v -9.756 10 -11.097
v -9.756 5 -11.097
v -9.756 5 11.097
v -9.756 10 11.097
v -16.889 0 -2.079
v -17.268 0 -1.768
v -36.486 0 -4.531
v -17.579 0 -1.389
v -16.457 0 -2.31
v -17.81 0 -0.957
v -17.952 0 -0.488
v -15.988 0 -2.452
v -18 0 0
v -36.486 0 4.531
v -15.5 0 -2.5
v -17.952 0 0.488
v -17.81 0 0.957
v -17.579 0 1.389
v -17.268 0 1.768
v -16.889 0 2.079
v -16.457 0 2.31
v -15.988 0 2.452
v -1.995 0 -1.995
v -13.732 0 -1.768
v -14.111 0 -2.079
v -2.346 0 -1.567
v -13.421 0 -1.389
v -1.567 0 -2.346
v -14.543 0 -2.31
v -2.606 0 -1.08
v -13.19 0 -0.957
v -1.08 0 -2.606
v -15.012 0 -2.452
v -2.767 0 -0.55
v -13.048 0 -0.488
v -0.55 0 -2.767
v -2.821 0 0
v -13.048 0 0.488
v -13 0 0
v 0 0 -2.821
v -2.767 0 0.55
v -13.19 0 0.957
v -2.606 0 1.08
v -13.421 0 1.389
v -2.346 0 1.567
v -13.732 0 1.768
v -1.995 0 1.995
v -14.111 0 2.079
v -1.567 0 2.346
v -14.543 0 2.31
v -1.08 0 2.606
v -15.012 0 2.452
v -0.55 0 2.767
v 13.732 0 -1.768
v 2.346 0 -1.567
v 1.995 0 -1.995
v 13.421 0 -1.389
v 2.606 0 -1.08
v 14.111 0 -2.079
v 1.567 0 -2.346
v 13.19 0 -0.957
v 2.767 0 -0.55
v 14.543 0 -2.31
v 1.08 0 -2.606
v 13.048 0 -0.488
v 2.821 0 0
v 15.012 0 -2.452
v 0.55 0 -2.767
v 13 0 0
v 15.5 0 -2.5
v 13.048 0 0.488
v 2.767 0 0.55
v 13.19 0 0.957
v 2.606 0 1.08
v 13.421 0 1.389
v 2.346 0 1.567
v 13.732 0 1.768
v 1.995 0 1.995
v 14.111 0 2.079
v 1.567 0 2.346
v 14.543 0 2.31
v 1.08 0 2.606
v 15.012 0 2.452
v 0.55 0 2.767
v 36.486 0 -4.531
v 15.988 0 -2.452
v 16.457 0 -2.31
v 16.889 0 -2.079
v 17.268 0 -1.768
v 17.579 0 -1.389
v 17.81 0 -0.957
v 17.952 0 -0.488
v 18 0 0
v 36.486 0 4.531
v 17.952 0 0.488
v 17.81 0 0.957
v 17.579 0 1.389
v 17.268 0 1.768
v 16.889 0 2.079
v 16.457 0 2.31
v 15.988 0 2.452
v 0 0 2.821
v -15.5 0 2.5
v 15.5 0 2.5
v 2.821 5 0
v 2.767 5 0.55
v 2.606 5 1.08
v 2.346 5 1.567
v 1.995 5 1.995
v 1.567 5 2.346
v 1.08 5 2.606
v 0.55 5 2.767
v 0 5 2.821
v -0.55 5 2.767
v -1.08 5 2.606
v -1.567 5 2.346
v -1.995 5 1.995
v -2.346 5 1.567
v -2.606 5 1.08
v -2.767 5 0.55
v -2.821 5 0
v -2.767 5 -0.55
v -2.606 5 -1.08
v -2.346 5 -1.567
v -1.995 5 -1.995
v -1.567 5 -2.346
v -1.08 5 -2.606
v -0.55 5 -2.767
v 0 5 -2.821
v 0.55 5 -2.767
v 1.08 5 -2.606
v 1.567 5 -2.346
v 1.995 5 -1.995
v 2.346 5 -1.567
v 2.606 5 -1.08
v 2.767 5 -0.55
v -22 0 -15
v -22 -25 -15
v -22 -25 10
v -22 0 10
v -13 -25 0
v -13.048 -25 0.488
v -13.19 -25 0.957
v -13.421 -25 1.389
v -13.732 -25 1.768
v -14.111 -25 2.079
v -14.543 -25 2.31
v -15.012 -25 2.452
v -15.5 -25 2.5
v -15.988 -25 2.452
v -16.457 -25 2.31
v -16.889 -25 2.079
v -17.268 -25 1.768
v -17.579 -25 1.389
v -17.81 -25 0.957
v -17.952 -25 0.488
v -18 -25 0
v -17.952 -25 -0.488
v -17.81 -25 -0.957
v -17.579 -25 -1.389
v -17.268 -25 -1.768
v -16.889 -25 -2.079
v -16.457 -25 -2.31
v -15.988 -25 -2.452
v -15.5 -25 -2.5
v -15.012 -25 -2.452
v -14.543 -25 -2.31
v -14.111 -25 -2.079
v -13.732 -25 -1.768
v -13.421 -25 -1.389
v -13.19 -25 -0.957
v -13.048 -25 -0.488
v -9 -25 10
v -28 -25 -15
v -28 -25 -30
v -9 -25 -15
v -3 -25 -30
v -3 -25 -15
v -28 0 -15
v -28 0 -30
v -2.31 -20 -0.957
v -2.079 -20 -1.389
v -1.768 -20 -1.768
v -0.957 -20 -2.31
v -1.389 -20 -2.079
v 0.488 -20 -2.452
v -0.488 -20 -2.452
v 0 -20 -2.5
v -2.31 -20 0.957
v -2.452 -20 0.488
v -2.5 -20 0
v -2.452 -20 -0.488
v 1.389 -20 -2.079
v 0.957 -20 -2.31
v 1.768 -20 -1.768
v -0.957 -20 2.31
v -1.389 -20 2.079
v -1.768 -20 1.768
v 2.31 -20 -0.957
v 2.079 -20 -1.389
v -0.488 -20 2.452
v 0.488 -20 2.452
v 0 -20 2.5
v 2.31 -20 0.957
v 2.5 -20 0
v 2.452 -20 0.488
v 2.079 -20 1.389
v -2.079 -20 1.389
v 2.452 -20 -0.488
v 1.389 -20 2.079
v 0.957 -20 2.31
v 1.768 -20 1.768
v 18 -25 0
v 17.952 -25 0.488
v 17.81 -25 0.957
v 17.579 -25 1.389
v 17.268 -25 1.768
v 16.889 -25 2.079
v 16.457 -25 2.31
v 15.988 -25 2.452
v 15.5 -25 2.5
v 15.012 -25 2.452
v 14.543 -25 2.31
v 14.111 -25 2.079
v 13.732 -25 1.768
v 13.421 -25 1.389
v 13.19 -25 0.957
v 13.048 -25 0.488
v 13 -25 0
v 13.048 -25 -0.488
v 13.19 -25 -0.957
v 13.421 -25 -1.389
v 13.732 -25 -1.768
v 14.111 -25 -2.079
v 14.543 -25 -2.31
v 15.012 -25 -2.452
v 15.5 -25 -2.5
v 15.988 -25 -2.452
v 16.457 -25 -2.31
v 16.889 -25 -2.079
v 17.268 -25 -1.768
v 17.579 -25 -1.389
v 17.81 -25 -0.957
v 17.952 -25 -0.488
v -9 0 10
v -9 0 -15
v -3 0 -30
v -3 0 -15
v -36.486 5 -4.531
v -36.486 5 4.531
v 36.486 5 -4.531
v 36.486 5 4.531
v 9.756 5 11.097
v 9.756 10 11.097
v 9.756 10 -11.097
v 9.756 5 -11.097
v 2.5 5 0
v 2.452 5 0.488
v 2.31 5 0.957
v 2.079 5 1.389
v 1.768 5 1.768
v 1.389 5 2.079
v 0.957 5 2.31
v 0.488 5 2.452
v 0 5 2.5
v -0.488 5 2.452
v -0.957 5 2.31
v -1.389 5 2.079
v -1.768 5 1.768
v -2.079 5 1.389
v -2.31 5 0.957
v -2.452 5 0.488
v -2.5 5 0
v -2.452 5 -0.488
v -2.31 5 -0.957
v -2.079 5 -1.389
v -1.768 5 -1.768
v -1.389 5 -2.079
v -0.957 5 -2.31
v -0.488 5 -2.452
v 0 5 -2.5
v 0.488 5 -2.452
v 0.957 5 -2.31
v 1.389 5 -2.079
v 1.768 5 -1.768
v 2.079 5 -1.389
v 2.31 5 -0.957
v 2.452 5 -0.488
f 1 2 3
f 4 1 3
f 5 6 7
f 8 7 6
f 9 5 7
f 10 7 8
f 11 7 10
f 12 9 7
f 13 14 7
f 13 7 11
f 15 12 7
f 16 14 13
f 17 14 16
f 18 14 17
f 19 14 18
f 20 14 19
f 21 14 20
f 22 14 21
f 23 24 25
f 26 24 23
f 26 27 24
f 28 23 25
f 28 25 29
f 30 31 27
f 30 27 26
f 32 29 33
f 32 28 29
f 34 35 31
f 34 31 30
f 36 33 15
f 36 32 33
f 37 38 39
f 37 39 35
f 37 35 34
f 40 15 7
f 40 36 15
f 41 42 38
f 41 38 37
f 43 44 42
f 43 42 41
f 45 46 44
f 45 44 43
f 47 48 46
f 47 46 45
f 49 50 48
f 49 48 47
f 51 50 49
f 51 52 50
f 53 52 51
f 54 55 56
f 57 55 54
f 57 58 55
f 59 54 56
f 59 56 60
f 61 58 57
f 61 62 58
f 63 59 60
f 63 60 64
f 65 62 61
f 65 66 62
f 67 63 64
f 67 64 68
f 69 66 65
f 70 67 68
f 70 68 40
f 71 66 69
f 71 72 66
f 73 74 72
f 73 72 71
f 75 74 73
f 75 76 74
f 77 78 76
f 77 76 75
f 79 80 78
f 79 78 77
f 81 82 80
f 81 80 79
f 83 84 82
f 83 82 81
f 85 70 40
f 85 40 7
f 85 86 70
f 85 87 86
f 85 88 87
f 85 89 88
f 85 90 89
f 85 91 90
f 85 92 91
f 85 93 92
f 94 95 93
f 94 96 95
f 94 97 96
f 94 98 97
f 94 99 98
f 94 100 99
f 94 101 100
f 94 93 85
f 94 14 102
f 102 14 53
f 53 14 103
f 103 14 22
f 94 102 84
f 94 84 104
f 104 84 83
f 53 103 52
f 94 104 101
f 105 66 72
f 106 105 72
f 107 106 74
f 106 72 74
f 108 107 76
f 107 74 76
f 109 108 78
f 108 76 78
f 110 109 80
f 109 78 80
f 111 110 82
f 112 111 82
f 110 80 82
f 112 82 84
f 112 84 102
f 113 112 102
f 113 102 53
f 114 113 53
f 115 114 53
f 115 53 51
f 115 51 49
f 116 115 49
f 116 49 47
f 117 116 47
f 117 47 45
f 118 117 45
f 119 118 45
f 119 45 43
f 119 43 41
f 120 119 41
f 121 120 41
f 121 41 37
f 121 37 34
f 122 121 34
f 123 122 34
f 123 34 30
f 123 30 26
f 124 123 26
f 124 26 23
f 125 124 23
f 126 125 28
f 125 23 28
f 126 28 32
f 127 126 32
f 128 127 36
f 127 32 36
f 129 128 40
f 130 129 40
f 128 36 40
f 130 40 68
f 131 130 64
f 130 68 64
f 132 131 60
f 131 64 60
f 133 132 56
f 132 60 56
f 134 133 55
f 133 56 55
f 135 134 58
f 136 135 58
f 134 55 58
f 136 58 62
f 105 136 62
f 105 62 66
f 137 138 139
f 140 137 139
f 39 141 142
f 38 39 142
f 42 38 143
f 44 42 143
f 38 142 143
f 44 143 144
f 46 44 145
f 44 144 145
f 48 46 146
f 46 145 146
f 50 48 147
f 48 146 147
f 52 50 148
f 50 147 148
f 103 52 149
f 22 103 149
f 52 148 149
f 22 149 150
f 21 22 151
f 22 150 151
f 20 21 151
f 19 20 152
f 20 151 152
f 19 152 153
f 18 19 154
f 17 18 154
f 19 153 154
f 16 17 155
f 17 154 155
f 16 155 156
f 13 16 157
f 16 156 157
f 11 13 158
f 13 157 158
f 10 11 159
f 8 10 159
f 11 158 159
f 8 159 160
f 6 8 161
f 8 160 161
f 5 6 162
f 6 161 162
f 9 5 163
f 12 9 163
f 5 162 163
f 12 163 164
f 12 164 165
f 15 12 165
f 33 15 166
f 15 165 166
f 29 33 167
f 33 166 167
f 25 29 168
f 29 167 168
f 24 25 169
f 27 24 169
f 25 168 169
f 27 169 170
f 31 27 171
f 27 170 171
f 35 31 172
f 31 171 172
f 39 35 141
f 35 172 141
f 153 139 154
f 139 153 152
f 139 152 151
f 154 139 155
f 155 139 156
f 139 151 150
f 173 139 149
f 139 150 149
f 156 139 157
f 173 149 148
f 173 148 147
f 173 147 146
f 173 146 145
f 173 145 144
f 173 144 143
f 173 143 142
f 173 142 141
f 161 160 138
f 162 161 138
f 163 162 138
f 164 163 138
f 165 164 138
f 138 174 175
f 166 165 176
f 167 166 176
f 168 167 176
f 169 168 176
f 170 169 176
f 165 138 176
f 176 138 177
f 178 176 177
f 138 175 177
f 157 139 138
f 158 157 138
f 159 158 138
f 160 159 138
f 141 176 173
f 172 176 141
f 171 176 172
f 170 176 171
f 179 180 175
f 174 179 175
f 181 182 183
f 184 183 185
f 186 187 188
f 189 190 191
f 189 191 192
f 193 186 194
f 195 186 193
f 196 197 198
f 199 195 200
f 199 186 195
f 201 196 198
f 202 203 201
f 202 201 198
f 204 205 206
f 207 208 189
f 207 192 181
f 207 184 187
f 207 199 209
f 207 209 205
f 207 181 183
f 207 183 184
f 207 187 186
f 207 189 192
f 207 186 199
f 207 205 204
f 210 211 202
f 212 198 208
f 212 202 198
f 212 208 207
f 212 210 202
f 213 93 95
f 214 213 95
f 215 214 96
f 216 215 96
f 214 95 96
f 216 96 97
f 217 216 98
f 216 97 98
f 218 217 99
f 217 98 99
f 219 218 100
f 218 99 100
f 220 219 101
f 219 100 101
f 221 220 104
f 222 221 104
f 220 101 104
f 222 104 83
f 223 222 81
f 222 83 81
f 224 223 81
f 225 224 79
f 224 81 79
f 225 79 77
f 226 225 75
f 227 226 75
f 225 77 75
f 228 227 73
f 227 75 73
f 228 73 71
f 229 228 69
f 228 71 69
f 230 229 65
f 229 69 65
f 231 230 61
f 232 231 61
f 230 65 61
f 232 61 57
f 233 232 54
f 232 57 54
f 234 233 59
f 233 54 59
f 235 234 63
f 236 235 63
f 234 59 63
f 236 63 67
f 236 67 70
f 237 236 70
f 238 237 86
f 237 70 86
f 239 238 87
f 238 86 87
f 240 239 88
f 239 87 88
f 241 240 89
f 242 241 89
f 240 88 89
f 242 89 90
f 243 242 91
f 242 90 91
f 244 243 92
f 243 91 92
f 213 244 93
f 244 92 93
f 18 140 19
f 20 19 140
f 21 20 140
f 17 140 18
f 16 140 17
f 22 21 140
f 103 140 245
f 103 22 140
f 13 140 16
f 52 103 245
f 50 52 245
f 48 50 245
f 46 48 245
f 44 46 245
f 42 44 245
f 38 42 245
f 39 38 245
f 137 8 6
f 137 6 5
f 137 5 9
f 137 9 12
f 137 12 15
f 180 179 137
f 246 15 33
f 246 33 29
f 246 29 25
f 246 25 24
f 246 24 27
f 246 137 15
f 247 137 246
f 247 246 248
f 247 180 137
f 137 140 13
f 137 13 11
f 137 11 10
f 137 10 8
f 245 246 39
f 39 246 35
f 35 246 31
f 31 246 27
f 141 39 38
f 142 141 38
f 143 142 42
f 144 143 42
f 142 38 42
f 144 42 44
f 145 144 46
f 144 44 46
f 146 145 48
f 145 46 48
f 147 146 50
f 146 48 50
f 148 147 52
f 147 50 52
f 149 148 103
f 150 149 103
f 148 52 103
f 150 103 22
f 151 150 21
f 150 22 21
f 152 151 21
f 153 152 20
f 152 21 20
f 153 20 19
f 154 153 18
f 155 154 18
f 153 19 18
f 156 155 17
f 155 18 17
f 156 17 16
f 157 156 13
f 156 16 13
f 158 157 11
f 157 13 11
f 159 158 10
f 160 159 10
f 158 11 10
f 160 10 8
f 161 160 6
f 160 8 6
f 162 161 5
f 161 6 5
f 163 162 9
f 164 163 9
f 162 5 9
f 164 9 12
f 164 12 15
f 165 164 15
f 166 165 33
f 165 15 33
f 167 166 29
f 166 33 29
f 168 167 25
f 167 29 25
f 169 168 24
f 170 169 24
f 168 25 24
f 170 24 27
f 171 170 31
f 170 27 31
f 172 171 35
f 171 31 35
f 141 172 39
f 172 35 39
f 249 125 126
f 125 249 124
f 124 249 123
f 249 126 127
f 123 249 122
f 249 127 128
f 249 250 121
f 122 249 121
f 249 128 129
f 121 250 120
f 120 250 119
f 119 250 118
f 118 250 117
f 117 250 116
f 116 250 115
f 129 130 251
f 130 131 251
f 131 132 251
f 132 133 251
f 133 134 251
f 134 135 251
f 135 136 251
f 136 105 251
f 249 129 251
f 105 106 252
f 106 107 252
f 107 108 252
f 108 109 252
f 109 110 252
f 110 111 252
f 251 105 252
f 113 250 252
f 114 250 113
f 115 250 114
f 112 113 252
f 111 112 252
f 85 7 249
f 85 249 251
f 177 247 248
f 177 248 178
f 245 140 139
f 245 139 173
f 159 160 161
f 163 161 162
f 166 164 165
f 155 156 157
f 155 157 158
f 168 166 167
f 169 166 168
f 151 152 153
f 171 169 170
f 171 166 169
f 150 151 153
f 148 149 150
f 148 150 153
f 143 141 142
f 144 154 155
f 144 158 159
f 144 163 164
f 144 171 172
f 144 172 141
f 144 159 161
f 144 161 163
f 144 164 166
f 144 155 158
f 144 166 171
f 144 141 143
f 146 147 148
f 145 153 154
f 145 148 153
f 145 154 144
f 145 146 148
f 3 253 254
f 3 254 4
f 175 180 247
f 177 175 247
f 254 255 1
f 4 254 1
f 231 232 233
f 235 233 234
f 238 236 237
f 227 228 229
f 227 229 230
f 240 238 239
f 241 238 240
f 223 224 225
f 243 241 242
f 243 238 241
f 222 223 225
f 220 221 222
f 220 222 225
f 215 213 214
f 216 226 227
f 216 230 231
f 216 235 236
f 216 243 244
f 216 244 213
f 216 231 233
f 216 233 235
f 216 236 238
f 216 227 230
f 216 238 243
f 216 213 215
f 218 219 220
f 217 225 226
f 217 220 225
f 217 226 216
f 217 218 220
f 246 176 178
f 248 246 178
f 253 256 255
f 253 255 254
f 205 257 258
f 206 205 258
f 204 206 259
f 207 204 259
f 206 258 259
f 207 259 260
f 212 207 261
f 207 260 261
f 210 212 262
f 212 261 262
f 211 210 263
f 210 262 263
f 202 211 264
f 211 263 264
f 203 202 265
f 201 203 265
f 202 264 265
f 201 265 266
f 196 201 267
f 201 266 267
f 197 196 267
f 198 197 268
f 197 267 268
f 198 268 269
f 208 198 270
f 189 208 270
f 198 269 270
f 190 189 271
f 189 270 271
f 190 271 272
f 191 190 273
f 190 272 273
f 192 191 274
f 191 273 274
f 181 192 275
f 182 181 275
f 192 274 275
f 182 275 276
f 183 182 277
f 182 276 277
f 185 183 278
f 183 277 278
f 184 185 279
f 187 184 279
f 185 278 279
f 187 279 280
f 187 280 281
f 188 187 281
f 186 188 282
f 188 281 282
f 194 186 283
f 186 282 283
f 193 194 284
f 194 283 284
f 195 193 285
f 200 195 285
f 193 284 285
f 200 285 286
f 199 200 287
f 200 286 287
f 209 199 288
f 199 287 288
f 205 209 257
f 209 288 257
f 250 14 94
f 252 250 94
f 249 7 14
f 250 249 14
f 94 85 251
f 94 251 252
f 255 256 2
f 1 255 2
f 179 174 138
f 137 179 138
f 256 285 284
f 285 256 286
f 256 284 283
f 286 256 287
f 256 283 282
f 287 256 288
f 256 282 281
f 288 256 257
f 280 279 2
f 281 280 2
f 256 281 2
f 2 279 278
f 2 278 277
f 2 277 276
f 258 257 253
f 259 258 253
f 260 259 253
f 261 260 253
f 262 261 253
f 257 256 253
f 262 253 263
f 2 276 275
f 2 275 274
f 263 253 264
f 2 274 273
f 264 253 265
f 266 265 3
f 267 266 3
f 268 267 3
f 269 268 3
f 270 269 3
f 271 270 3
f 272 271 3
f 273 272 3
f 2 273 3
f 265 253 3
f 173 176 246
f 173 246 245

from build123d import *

# Parameters (mm, degrees)
F0_W      = 25
F0_H      = 30
F1_DEPTH  = 25
F2_DEPTH  = 10
F3_R      = 2.5
F4_DEPTH  = 25
F5_W      = 72.9725211859
F5_H      = 9.0611493215
F6_DEPTH  = 5
F7_R      = 2.5
F8_DEPTH  = 25
F9_R      = 2.8211111783
F10_DEPTH = 25
F11_W     = 19.5124316961
F11_H     = 22.1939049661
F12_DEPTH = 5
F13_R     = 2.5
F14_DEPTH = 25
F15_W     = 6
F15_H     = 25
F16_DEPTH = 25


with BuildPart() as f1:
    # F0 (on Front) → F1 (new body)
    with BuildSketch(Plane.XZ):
        with Locations((-15.5, -15)):
            Rectangle(F0_W, F0_H)
    extrude(amount=F1_DEPTH)

    # F2 (add): a face of the model
    f2_faces = [f1.faces().sort_by_distance(p)[0] for p in [
        (-15.5, -12.5, 0),
    ]]
    extrude(f2_faces, amount=F2_DEPTH)

    # F3 (on face) → F4 (cut)
    with BuildSketch(Plane.XZ.offset(25)):
        with Locations((-15.5, 0)):
            Circle(F3_R)
    extrude(amount=-F4_DEPTH, mode=Mode.SUBTRACT)

    # F15 (on face) → F16 (cut)
    with BuildSketch(Plane.XZ.offset(25)):
        with Locations((-25, -2.5)):
            Rectangle(F15_W, F15_H)
        with Locations((-6, -2.5)):
            Rectangle(F15_W, F15_H)
    extrude(amount=-F16_DEPTH, mode=Mode.SUBTRACT)


with BuildPart() as f6:
    # F5 (on Front) → F6 (new body)
    with BuildSketch(Plane.XZ):
        Rectangle(F5_W, F5_H)
    extrude(amount=-F6_DEPTH)

    # F7 (on face) → F8 (join)
    with BuildSketch(Plane.XZ):
        with Locations((-15.5, 0)):
            Circle(F7_R)
        with Locations((15.5, 0)):
            Circle(F7_R)
    extrude(amount=F8_DEPTH)

    # F9 (on face) → F10 (cut)
    with BuildSketch(Plane.XZ):
        Circle(F9_R)
    extrude(amount=-F10_DEPTH, mode=Mode.SUBTRACT)


with BuildPart() as f12:
    # F11 (on face) → F12 (new body)
    with BuildSketch(Plane(origin=(0, 5, 0), x_dir=(-1, 0, 0), z_dir=(0, 1, 0))):
        Rectangle(F11_W, F11_H)
    extrude(amount=F12_DEPTH)

    # F13 (on face) → F14 (join)
    with BuildSketch(Plane.XZ.offset(-5)):
        Circle(F13_R)
    extrude(amount=F14_DEPTH)


solid = Compound([f1.part, f6.part, f12.part])
